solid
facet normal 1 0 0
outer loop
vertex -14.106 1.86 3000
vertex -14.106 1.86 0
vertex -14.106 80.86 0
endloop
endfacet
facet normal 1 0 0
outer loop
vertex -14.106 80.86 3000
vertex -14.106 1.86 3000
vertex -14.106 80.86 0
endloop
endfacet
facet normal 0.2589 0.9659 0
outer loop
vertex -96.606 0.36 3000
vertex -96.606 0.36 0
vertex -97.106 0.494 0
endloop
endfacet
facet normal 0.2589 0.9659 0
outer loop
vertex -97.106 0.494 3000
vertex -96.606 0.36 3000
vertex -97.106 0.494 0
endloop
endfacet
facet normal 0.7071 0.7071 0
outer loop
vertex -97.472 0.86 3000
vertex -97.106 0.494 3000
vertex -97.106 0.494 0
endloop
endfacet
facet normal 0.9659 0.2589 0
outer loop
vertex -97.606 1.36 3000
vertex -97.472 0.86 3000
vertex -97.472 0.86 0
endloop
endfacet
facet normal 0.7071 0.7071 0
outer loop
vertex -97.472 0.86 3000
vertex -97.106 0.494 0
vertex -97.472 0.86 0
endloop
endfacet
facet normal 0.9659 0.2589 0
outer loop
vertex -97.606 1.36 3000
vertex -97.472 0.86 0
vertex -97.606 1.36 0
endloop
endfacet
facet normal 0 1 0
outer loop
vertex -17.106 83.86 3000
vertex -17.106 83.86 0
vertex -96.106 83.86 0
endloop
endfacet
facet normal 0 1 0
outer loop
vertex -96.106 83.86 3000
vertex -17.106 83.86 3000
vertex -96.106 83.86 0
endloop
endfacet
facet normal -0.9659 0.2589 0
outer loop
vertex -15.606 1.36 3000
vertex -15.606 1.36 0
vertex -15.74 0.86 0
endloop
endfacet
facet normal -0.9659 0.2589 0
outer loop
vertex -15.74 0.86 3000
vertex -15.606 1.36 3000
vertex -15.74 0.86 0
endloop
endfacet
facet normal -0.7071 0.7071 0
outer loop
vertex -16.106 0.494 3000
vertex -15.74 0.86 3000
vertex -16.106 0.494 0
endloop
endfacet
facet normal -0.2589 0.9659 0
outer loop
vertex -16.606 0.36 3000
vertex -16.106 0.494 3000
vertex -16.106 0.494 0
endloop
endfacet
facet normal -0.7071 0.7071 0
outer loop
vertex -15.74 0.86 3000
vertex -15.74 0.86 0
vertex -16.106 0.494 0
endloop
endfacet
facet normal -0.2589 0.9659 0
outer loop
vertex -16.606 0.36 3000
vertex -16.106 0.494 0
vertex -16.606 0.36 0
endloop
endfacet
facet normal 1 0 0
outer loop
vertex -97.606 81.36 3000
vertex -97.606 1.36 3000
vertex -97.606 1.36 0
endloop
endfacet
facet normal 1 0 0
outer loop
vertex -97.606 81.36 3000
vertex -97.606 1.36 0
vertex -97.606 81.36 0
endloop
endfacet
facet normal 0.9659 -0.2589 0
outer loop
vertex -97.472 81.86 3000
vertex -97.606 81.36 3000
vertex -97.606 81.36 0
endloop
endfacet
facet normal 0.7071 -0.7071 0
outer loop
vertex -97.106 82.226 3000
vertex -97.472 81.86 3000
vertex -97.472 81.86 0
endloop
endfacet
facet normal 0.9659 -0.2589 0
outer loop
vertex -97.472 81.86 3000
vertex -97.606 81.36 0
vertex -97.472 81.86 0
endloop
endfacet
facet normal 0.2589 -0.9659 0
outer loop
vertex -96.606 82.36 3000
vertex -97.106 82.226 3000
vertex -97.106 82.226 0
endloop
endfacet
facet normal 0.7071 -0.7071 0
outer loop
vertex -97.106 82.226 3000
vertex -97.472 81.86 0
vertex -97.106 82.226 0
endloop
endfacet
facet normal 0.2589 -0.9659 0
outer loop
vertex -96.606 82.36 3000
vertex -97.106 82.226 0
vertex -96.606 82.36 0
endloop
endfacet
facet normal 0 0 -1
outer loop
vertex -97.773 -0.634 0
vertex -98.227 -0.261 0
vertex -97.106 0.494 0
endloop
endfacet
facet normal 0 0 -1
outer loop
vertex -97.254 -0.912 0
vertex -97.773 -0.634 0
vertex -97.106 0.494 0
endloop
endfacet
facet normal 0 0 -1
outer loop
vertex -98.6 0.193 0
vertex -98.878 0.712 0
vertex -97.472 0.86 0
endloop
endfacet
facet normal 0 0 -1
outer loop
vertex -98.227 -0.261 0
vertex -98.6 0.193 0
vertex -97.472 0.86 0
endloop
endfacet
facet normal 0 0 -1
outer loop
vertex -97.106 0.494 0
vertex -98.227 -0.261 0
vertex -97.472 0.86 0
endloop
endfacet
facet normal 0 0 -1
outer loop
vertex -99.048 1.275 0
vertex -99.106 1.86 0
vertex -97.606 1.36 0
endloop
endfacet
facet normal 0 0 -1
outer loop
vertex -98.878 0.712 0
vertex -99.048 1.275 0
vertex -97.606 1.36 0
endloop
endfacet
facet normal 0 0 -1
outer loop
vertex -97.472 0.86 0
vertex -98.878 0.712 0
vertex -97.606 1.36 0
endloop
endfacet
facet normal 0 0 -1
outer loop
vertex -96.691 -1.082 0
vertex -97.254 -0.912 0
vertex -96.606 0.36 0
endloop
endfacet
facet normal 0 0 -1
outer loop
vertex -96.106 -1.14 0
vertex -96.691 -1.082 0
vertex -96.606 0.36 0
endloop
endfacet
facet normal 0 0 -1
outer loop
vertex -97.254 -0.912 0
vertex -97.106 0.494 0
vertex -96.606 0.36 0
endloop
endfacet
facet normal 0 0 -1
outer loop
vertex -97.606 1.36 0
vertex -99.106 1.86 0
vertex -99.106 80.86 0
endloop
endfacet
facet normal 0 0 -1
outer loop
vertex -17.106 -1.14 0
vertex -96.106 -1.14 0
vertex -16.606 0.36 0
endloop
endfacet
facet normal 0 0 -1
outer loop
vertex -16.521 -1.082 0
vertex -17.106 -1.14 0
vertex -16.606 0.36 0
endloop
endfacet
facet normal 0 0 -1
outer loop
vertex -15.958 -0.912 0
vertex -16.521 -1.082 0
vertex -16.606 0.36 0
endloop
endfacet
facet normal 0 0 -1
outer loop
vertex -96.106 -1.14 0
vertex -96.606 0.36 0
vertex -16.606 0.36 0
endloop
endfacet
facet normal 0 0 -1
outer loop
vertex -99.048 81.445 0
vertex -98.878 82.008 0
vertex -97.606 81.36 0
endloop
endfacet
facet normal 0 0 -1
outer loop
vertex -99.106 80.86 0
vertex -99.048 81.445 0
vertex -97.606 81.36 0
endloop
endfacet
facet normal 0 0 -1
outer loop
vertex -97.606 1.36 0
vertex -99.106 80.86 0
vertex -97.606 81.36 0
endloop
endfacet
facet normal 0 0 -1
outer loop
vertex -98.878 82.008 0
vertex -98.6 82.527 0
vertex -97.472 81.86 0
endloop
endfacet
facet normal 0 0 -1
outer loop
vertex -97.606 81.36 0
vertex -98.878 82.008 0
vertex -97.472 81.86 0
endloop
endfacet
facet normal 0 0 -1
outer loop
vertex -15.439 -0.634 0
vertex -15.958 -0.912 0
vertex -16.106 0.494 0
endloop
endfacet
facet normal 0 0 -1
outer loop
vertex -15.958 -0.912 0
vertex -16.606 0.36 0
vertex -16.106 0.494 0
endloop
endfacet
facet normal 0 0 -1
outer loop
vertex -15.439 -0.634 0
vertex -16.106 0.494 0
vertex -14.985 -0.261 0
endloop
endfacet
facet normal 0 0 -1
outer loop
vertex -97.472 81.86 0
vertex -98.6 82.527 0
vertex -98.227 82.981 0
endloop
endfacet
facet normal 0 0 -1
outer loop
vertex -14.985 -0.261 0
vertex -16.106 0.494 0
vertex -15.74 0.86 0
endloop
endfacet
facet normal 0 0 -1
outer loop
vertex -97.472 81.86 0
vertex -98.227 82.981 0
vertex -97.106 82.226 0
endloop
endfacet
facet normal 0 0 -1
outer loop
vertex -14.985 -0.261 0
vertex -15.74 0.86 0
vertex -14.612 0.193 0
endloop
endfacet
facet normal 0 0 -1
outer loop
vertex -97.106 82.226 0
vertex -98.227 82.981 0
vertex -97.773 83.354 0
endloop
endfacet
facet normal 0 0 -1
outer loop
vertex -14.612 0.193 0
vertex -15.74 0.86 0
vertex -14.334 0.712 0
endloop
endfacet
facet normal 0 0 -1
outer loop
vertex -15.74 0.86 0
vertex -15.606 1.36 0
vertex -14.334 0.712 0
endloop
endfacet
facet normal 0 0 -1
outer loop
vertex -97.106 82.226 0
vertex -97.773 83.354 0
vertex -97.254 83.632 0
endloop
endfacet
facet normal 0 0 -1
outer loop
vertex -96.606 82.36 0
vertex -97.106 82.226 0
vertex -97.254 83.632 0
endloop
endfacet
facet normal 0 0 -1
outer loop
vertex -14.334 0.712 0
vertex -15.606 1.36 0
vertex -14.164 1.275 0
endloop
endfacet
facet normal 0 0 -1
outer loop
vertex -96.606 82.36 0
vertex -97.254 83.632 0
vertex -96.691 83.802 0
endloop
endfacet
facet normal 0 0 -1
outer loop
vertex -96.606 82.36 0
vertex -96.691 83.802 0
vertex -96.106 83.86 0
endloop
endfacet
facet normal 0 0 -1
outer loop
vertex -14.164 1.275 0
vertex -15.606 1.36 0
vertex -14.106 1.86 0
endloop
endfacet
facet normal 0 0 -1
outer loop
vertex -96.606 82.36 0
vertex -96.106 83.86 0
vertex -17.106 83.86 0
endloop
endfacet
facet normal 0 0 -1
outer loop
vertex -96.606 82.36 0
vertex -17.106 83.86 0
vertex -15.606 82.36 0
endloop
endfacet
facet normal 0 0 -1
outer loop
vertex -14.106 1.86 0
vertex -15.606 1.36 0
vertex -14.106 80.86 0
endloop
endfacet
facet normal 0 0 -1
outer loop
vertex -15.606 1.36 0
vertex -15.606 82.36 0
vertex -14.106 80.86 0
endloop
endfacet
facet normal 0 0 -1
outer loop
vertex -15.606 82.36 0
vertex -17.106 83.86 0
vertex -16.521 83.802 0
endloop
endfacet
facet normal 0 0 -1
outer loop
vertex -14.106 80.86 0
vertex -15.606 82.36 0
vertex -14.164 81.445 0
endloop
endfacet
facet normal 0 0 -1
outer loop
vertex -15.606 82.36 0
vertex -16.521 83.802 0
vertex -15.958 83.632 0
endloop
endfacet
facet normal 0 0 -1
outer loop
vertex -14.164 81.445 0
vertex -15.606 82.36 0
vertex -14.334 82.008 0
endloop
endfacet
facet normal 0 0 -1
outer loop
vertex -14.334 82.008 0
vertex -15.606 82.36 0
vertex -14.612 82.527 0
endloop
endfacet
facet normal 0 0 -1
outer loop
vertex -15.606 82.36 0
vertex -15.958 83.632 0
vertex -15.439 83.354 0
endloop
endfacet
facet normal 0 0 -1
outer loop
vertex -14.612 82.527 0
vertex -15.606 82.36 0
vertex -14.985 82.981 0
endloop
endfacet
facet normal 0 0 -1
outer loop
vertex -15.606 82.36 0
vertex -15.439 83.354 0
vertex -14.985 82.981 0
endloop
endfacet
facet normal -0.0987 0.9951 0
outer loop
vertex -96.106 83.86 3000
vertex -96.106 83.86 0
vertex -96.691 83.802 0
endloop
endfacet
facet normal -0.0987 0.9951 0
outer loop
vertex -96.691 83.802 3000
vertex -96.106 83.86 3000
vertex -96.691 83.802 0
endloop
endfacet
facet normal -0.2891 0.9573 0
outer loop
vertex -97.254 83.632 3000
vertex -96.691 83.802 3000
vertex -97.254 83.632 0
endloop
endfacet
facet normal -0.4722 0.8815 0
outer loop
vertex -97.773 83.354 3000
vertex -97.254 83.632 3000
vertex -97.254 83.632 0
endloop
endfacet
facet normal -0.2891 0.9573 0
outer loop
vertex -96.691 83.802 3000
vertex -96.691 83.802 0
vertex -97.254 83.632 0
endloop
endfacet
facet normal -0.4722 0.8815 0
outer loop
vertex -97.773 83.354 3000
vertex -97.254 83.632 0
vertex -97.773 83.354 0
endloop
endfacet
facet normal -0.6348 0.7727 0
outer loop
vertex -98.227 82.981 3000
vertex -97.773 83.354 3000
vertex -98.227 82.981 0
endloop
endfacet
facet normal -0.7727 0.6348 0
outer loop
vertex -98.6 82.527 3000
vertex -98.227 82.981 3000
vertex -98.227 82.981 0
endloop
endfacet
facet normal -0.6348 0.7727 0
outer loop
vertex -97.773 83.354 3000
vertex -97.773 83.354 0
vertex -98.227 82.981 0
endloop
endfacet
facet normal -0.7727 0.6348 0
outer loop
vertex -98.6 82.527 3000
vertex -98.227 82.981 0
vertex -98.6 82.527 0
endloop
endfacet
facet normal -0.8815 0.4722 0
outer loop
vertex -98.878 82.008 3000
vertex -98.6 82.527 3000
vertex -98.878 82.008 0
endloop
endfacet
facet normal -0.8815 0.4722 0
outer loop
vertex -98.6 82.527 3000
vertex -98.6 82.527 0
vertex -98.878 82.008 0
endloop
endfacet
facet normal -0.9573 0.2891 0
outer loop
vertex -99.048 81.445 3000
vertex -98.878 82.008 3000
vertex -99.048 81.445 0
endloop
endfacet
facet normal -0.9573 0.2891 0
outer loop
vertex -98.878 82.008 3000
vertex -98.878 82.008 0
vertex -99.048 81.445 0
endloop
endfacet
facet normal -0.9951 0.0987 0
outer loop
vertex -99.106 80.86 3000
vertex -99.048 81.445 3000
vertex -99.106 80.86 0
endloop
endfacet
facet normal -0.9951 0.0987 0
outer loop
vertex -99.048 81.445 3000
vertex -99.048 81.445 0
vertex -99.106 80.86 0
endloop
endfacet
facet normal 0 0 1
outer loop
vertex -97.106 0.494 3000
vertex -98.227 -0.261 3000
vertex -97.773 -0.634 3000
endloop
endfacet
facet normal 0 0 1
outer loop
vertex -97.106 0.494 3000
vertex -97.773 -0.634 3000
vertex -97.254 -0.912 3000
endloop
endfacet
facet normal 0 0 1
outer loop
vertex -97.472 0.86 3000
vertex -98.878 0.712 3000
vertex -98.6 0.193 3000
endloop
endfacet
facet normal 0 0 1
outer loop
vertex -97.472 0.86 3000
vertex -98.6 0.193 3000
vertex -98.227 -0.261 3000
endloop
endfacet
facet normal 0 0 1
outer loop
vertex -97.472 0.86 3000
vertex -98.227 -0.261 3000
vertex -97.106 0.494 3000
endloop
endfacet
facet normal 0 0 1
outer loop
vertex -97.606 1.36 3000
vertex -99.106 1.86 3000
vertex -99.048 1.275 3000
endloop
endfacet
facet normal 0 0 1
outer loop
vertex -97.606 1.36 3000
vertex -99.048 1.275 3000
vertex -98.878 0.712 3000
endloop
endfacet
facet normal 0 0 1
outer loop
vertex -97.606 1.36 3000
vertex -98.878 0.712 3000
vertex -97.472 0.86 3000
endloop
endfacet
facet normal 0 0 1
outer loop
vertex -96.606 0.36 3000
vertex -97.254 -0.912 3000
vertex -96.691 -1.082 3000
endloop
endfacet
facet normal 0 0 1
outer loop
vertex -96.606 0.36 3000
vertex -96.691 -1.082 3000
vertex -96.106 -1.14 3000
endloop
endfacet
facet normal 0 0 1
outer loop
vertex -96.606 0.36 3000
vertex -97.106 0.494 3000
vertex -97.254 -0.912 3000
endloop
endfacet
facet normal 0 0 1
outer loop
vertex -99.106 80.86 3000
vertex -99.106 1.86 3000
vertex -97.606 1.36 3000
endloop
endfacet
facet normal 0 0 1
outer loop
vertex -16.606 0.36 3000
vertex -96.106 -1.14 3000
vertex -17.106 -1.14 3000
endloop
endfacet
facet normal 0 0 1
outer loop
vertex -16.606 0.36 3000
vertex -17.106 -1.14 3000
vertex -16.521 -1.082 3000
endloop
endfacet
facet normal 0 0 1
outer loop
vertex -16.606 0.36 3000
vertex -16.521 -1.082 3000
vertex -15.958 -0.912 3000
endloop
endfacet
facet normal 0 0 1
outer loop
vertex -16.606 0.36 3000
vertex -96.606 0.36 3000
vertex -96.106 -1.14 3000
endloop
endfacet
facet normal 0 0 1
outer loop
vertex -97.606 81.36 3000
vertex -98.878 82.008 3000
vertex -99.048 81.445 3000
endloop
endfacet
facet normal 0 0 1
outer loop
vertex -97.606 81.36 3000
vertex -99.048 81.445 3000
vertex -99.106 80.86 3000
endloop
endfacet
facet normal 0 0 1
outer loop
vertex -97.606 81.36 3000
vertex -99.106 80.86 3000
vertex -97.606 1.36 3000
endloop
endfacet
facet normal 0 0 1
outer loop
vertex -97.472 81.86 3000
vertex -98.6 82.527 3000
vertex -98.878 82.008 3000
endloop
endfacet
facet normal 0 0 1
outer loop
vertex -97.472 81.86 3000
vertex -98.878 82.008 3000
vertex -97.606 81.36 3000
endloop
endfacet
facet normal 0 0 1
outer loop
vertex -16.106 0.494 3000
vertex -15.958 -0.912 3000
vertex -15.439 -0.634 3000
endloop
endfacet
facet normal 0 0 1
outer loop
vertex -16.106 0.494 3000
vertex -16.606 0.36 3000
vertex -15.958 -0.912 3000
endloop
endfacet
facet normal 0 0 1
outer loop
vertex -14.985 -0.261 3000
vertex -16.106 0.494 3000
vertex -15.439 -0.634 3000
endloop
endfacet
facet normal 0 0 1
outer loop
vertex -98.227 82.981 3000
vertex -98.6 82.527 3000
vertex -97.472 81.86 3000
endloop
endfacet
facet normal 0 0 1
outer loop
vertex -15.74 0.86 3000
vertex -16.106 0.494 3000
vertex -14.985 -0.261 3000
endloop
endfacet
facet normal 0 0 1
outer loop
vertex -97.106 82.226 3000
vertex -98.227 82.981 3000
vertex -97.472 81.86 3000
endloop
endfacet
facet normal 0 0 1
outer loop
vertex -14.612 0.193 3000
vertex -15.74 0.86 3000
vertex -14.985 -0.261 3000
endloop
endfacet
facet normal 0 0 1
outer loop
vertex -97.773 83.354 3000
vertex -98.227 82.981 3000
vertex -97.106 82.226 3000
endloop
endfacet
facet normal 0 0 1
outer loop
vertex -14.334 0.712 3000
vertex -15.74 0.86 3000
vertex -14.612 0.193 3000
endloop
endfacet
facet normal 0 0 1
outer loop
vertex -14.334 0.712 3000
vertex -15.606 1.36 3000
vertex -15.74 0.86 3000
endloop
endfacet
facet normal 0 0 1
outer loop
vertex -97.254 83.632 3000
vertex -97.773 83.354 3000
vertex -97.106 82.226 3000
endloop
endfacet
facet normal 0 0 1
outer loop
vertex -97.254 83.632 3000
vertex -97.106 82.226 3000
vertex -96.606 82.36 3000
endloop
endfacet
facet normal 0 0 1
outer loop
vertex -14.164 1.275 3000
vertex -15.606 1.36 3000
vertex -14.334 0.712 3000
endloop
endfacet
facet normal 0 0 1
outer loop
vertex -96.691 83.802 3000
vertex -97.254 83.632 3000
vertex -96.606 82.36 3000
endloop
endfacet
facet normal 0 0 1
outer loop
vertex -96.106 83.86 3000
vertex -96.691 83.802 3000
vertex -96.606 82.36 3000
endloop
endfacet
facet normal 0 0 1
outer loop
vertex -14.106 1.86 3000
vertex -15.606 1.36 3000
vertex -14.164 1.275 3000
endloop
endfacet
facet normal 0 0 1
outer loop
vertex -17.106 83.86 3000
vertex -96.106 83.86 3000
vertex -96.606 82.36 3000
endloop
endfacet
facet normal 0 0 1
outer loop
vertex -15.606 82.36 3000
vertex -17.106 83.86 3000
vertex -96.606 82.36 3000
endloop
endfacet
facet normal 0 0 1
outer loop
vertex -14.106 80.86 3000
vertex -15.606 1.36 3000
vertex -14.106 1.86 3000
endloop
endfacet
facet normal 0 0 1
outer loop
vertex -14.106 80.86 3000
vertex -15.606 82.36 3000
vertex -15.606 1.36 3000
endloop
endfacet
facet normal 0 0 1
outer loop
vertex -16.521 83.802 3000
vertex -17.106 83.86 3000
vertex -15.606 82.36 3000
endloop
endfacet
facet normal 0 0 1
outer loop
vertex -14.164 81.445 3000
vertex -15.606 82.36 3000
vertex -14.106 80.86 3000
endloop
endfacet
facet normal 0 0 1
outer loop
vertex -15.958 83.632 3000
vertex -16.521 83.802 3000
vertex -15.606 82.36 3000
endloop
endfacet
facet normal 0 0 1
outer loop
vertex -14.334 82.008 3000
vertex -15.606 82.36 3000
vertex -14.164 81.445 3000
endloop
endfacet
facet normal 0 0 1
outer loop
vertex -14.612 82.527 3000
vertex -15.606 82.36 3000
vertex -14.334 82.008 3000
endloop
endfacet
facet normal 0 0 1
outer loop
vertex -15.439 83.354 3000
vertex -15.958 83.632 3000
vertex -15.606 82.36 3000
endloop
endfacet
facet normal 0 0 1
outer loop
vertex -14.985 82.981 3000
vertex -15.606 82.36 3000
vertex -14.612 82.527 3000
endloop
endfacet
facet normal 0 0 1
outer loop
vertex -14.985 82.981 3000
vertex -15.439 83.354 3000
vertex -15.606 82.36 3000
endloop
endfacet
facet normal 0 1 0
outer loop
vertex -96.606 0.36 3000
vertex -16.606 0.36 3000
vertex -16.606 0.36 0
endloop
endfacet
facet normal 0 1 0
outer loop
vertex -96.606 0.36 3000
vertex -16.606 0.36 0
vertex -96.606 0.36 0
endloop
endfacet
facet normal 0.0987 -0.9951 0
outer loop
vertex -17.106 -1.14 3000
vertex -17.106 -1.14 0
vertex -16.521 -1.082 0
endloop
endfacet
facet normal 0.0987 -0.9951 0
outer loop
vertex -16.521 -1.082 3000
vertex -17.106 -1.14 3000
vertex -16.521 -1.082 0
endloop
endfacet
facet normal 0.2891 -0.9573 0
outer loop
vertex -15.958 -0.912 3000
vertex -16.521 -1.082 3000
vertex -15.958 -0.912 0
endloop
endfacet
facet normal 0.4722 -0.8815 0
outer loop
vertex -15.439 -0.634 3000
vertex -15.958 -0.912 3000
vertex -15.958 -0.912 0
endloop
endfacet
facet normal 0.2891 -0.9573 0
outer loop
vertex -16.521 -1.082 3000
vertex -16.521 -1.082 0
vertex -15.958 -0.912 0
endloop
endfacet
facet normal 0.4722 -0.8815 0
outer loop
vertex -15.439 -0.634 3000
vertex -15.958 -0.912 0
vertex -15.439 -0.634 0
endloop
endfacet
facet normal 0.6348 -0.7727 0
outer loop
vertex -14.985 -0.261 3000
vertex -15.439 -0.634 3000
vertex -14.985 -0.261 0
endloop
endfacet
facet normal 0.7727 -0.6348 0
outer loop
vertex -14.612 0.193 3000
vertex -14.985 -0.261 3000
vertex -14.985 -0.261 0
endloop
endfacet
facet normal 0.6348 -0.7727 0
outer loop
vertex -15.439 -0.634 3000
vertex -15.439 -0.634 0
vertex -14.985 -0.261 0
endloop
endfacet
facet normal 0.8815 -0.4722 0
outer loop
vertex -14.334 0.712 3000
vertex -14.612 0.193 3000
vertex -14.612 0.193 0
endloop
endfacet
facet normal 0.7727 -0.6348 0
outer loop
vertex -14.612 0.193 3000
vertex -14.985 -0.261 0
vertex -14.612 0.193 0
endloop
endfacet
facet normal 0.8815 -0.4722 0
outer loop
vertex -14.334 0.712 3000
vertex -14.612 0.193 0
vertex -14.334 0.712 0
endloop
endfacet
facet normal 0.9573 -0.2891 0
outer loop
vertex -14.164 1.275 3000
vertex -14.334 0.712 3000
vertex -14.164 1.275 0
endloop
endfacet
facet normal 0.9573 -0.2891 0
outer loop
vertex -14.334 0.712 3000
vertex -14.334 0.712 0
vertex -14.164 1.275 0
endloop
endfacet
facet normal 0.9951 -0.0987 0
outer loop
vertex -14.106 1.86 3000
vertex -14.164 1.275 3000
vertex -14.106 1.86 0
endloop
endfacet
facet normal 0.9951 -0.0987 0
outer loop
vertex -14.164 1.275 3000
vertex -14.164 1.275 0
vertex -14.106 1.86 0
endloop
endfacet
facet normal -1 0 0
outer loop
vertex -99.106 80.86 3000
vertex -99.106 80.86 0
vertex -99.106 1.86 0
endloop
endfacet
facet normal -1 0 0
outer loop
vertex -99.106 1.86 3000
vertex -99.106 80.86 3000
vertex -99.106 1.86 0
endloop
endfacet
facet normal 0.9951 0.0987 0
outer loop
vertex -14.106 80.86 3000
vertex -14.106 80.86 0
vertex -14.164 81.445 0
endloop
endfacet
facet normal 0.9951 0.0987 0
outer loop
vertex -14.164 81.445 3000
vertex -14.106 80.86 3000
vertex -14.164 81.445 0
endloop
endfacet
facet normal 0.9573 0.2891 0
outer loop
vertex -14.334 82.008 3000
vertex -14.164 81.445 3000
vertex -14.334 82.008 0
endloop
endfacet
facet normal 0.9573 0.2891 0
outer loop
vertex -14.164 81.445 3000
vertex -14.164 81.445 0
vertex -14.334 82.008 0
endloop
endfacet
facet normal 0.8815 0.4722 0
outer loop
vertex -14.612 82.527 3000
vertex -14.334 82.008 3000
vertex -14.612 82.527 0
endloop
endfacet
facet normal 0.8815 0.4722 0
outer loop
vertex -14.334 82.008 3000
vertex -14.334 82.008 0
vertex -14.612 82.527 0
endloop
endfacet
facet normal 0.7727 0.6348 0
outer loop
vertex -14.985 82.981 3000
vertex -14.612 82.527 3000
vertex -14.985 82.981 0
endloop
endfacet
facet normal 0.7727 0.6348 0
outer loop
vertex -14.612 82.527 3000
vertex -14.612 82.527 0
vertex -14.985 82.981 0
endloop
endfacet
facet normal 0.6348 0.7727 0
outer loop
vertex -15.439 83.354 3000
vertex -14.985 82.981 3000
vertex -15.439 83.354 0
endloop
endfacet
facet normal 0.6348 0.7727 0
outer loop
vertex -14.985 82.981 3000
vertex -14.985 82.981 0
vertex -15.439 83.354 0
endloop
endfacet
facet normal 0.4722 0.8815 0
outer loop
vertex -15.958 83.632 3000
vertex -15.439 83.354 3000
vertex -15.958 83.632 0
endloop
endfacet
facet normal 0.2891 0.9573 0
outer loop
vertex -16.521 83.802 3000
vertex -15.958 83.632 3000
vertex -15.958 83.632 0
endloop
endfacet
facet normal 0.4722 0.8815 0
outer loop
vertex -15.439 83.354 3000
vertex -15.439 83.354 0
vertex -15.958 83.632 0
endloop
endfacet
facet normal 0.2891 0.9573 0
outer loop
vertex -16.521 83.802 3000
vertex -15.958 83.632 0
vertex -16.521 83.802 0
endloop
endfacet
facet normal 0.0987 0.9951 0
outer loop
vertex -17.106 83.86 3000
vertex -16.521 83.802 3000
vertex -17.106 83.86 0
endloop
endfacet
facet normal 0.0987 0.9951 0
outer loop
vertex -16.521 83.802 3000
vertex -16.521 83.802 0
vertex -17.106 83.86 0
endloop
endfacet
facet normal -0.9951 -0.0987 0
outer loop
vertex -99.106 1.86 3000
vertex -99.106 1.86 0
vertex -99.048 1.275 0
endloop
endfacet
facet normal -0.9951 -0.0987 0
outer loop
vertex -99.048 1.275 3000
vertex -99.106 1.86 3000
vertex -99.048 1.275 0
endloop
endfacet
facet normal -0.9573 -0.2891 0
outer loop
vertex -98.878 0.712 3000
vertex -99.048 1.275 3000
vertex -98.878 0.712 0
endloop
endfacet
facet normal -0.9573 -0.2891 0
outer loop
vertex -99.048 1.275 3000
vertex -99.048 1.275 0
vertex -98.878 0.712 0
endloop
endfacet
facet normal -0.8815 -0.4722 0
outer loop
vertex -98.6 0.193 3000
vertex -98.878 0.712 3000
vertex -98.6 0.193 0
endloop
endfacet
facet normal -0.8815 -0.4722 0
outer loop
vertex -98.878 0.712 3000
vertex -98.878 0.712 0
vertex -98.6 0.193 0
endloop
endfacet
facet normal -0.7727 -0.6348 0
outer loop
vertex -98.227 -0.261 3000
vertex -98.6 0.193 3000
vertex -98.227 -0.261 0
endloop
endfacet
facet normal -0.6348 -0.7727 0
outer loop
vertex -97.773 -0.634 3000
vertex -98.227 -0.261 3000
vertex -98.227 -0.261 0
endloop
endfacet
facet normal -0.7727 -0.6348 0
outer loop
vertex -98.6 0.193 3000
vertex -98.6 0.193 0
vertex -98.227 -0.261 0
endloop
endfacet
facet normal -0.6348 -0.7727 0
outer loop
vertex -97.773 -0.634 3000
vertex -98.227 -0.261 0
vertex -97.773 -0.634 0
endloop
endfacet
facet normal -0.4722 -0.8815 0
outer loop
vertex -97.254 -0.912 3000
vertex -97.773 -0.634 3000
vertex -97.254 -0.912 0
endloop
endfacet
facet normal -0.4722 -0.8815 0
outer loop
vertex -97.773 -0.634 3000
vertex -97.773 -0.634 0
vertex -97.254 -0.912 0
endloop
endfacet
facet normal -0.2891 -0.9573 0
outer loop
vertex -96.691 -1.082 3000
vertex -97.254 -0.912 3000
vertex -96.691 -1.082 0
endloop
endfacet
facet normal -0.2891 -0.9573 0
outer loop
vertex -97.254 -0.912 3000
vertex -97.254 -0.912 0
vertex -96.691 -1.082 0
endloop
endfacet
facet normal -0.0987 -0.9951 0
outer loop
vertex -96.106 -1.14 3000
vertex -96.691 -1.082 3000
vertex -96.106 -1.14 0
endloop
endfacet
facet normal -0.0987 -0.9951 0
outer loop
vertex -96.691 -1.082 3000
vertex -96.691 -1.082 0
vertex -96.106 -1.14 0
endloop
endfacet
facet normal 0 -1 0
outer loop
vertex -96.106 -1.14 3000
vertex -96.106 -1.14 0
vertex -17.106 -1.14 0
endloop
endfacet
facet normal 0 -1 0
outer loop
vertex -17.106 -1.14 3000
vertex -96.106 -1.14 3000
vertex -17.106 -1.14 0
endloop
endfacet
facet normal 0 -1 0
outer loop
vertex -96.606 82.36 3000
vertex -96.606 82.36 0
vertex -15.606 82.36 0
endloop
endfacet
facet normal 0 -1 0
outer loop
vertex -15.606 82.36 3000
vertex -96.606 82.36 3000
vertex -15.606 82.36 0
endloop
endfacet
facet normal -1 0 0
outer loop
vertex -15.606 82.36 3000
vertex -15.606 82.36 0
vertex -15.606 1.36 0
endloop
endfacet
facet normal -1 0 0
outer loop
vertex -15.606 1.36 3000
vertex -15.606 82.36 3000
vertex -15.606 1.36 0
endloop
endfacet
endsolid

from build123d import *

# Parameters (mm, degrees)
F1_DEPTH = 3000


with BuildPart() as f1:
    # F0 (on Top) → F1 (new body)
    with BuildSketch(Plane.XY):
        with BuildLine():
            Line((-17.106065, 83.860049), (-96.106065, 83.860049))
            ThreePointArc((-96.106065, 83.860049), (-98.227386, 82.981369), (-99.106065, 80.860049))
            Line((-99.106065, 80.860049), (-99.106065, 1.860049))
            ThreePointArc((-99.106065, 1.860049), (-98.227386, -0.261271), (-96.106065, -1.139951))
            Line((-96.106065, -1.139951), (-17.106065, -1.139951))
            ThreePointArc((-17.106065, -1.139951), (-14.984745, -0.261271), (-14.106065, 1.860049))
            Line((-14.106065, 1.860049), (-14.106065, 80.860049))
            ThreePointArc((-14.106065, 80.860049), (-14.984745, 82.981369), (-17.106065, 83.860049))
        make_face()
        with BuildLine():
            Line((-16.606065, 0.360049), (-96.606065, 0.360049))
            ThreePointArc((-96.606065, 0.360049), (-97.313172, 0.652942), (-97.606065, 1.360049))
            Line((-97.606065, 1.360049), (-97.606065, 81.360049))
            ThreePointArc((-97.606065, 81.360049), (-97.313172, 82.067156), (-96.606065, 82.360049))
            Line((-96.606065, 82.360049), (-15.606065, 82.360049))
            Line((-15.606065, 82.360049), (-15.606065, 1.360049))
            ThreePointArc((-15.606065, 1.360049), (-15.898959, 0.652942), (-16.606065, 0.360049))
        make_face(mode=Mode.SUBTRACT)
    extrude(amount=F1_DEPTH)


solid = f1.part
